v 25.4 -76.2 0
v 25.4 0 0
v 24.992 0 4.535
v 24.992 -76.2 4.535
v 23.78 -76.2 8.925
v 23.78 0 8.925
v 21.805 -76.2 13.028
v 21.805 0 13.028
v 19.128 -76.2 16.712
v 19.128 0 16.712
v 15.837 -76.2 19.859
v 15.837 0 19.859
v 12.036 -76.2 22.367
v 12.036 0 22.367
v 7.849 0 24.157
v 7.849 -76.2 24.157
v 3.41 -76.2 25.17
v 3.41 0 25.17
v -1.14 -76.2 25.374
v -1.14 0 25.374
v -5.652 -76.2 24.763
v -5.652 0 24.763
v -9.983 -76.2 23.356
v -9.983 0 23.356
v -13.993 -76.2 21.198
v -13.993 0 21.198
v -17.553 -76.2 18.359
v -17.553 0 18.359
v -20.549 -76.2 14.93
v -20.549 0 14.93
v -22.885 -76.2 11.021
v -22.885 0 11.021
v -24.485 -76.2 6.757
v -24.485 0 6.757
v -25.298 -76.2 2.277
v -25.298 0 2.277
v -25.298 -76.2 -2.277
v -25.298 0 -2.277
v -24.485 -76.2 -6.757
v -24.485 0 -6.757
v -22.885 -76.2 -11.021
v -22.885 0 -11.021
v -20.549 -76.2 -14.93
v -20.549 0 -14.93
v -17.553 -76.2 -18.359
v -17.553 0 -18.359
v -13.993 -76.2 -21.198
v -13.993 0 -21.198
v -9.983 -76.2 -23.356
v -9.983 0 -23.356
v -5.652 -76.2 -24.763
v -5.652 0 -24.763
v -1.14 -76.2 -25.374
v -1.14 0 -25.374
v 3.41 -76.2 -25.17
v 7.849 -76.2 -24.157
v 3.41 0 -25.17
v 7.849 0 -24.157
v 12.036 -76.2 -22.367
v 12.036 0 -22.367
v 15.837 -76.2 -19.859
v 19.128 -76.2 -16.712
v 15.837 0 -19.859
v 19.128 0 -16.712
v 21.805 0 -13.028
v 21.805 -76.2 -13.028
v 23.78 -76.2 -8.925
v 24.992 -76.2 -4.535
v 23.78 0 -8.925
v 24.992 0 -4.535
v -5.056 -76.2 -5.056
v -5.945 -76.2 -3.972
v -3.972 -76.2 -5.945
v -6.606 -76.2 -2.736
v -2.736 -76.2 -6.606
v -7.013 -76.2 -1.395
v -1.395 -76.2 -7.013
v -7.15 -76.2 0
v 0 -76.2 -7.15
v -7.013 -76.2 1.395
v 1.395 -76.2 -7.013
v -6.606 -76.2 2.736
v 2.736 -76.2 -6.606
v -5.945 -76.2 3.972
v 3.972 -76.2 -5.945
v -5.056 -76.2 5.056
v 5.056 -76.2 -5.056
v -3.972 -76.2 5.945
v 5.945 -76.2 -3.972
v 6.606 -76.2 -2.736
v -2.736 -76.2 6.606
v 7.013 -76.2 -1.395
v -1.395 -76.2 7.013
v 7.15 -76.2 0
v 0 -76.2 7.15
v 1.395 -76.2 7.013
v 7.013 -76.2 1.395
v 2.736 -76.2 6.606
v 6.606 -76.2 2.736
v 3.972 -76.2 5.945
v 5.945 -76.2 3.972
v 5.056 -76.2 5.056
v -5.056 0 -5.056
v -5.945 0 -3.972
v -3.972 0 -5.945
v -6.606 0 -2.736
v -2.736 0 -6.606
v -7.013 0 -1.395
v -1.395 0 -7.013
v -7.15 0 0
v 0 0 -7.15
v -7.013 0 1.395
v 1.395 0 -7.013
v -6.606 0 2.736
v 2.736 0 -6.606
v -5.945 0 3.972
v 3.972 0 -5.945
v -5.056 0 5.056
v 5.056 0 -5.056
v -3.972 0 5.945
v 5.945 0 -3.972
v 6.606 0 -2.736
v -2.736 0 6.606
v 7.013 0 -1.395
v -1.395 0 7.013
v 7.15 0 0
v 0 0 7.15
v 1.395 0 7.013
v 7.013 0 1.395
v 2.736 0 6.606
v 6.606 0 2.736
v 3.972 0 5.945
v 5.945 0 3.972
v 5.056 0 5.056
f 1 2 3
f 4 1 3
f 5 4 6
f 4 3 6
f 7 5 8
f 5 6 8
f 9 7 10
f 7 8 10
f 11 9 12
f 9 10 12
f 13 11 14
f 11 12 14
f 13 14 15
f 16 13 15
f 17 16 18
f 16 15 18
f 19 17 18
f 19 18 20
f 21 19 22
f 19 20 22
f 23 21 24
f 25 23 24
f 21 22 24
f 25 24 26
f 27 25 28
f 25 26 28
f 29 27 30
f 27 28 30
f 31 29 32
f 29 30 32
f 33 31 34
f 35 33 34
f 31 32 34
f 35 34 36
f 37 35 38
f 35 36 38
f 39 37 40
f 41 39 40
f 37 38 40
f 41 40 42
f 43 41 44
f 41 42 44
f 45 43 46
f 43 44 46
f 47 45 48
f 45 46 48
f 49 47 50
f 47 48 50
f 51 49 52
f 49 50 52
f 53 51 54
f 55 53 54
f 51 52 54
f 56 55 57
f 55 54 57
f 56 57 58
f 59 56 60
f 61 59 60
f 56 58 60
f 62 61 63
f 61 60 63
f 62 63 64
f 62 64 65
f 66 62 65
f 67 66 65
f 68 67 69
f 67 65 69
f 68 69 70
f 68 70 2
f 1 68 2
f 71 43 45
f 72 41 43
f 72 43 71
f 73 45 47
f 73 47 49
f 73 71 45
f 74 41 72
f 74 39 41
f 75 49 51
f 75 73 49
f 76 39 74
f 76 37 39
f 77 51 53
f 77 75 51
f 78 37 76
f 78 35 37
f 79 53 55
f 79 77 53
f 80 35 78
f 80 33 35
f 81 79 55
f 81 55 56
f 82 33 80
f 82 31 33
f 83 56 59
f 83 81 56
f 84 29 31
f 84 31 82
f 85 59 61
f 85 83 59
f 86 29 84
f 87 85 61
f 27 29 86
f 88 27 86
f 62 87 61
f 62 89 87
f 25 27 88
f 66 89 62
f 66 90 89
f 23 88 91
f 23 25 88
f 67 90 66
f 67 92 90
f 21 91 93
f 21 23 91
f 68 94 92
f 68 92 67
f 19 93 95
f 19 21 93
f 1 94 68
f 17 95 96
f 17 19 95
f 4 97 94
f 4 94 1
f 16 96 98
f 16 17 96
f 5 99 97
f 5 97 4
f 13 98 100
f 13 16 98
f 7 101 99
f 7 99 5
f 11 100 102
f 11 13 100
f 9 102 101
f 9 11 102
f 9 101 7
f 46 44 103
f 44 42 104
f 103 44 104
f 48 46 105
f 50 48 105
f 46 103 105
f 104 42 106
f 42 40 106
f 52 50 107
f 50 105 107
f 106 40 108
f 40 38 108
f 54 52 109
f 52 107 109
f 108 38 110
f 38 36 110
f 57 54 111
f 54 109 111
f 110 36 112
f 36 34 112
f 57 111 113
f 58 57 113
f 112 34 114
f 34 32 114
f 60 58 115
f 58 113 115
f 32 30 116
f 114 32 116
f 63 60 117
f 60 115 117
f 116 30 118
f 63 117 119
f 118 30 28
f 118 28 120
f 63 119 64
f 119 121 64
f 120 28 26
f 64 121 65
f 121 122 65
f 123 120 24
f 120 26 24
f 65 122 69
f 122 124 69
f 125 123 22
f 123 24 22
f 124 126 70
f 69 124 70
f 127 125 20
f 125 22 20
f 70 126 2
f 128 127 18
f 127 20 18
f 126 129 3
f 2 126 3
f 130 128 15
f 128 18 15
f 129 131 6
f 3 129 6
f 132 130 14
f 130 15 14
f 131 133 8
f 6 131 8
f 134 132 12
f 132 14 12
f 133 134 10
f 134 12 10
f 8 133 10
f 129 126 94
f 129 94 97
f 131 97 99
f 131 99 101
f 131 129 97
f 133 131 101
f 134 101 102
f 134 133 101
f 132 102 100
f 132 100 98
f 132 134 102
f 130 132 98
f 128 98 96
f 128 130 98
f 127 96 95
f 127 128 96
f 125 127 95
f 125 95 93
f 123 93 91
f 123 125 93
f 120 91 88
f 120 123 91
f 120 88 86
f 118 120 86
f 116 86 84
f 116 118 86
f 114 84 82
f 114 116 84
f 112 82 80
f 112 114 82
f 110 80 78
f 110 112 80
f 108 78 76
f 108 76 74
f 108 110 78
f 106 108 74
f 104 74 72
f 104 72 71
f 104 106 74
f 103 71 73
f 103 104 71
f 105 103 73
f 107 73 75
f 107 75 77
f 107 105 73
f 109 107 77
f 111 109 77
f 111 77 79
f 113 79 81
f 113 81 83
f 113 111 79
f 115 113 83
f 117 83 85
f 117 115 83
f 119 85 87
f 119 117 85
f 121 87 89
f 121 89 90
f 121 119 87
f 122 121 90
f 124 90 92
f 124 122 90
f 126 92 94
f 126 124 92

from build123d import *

# Parameters (mm, degrees)
F0_R     = 25.4
F0_R_2   = 7.1501
F1_DEPTH = 76.2
F3_R     = 25.4
F3_R_2   = 7.1501
F4_DEPTH = 76.2


with BuildPart() as f1:
    # F0 (on Right) → F1 (new body)
    with BuildSketch(Plane.YZ):
        Circle(F0_R)
        Circle(F0_R_2, mode=Mode.SUBTRACT)
    extrude(amount=F1_DEPTH)


with BuildPart() as f4:
    # F3 (on Front) → F4 (new body)
    with BuildSketch(Plane.XZ):
        Circle(F3_R)
        Circle(F3_R_2, mode=Mode.SUBTRACT)
    extrude(amount=F4_DEPTH)


solid = f4.part
